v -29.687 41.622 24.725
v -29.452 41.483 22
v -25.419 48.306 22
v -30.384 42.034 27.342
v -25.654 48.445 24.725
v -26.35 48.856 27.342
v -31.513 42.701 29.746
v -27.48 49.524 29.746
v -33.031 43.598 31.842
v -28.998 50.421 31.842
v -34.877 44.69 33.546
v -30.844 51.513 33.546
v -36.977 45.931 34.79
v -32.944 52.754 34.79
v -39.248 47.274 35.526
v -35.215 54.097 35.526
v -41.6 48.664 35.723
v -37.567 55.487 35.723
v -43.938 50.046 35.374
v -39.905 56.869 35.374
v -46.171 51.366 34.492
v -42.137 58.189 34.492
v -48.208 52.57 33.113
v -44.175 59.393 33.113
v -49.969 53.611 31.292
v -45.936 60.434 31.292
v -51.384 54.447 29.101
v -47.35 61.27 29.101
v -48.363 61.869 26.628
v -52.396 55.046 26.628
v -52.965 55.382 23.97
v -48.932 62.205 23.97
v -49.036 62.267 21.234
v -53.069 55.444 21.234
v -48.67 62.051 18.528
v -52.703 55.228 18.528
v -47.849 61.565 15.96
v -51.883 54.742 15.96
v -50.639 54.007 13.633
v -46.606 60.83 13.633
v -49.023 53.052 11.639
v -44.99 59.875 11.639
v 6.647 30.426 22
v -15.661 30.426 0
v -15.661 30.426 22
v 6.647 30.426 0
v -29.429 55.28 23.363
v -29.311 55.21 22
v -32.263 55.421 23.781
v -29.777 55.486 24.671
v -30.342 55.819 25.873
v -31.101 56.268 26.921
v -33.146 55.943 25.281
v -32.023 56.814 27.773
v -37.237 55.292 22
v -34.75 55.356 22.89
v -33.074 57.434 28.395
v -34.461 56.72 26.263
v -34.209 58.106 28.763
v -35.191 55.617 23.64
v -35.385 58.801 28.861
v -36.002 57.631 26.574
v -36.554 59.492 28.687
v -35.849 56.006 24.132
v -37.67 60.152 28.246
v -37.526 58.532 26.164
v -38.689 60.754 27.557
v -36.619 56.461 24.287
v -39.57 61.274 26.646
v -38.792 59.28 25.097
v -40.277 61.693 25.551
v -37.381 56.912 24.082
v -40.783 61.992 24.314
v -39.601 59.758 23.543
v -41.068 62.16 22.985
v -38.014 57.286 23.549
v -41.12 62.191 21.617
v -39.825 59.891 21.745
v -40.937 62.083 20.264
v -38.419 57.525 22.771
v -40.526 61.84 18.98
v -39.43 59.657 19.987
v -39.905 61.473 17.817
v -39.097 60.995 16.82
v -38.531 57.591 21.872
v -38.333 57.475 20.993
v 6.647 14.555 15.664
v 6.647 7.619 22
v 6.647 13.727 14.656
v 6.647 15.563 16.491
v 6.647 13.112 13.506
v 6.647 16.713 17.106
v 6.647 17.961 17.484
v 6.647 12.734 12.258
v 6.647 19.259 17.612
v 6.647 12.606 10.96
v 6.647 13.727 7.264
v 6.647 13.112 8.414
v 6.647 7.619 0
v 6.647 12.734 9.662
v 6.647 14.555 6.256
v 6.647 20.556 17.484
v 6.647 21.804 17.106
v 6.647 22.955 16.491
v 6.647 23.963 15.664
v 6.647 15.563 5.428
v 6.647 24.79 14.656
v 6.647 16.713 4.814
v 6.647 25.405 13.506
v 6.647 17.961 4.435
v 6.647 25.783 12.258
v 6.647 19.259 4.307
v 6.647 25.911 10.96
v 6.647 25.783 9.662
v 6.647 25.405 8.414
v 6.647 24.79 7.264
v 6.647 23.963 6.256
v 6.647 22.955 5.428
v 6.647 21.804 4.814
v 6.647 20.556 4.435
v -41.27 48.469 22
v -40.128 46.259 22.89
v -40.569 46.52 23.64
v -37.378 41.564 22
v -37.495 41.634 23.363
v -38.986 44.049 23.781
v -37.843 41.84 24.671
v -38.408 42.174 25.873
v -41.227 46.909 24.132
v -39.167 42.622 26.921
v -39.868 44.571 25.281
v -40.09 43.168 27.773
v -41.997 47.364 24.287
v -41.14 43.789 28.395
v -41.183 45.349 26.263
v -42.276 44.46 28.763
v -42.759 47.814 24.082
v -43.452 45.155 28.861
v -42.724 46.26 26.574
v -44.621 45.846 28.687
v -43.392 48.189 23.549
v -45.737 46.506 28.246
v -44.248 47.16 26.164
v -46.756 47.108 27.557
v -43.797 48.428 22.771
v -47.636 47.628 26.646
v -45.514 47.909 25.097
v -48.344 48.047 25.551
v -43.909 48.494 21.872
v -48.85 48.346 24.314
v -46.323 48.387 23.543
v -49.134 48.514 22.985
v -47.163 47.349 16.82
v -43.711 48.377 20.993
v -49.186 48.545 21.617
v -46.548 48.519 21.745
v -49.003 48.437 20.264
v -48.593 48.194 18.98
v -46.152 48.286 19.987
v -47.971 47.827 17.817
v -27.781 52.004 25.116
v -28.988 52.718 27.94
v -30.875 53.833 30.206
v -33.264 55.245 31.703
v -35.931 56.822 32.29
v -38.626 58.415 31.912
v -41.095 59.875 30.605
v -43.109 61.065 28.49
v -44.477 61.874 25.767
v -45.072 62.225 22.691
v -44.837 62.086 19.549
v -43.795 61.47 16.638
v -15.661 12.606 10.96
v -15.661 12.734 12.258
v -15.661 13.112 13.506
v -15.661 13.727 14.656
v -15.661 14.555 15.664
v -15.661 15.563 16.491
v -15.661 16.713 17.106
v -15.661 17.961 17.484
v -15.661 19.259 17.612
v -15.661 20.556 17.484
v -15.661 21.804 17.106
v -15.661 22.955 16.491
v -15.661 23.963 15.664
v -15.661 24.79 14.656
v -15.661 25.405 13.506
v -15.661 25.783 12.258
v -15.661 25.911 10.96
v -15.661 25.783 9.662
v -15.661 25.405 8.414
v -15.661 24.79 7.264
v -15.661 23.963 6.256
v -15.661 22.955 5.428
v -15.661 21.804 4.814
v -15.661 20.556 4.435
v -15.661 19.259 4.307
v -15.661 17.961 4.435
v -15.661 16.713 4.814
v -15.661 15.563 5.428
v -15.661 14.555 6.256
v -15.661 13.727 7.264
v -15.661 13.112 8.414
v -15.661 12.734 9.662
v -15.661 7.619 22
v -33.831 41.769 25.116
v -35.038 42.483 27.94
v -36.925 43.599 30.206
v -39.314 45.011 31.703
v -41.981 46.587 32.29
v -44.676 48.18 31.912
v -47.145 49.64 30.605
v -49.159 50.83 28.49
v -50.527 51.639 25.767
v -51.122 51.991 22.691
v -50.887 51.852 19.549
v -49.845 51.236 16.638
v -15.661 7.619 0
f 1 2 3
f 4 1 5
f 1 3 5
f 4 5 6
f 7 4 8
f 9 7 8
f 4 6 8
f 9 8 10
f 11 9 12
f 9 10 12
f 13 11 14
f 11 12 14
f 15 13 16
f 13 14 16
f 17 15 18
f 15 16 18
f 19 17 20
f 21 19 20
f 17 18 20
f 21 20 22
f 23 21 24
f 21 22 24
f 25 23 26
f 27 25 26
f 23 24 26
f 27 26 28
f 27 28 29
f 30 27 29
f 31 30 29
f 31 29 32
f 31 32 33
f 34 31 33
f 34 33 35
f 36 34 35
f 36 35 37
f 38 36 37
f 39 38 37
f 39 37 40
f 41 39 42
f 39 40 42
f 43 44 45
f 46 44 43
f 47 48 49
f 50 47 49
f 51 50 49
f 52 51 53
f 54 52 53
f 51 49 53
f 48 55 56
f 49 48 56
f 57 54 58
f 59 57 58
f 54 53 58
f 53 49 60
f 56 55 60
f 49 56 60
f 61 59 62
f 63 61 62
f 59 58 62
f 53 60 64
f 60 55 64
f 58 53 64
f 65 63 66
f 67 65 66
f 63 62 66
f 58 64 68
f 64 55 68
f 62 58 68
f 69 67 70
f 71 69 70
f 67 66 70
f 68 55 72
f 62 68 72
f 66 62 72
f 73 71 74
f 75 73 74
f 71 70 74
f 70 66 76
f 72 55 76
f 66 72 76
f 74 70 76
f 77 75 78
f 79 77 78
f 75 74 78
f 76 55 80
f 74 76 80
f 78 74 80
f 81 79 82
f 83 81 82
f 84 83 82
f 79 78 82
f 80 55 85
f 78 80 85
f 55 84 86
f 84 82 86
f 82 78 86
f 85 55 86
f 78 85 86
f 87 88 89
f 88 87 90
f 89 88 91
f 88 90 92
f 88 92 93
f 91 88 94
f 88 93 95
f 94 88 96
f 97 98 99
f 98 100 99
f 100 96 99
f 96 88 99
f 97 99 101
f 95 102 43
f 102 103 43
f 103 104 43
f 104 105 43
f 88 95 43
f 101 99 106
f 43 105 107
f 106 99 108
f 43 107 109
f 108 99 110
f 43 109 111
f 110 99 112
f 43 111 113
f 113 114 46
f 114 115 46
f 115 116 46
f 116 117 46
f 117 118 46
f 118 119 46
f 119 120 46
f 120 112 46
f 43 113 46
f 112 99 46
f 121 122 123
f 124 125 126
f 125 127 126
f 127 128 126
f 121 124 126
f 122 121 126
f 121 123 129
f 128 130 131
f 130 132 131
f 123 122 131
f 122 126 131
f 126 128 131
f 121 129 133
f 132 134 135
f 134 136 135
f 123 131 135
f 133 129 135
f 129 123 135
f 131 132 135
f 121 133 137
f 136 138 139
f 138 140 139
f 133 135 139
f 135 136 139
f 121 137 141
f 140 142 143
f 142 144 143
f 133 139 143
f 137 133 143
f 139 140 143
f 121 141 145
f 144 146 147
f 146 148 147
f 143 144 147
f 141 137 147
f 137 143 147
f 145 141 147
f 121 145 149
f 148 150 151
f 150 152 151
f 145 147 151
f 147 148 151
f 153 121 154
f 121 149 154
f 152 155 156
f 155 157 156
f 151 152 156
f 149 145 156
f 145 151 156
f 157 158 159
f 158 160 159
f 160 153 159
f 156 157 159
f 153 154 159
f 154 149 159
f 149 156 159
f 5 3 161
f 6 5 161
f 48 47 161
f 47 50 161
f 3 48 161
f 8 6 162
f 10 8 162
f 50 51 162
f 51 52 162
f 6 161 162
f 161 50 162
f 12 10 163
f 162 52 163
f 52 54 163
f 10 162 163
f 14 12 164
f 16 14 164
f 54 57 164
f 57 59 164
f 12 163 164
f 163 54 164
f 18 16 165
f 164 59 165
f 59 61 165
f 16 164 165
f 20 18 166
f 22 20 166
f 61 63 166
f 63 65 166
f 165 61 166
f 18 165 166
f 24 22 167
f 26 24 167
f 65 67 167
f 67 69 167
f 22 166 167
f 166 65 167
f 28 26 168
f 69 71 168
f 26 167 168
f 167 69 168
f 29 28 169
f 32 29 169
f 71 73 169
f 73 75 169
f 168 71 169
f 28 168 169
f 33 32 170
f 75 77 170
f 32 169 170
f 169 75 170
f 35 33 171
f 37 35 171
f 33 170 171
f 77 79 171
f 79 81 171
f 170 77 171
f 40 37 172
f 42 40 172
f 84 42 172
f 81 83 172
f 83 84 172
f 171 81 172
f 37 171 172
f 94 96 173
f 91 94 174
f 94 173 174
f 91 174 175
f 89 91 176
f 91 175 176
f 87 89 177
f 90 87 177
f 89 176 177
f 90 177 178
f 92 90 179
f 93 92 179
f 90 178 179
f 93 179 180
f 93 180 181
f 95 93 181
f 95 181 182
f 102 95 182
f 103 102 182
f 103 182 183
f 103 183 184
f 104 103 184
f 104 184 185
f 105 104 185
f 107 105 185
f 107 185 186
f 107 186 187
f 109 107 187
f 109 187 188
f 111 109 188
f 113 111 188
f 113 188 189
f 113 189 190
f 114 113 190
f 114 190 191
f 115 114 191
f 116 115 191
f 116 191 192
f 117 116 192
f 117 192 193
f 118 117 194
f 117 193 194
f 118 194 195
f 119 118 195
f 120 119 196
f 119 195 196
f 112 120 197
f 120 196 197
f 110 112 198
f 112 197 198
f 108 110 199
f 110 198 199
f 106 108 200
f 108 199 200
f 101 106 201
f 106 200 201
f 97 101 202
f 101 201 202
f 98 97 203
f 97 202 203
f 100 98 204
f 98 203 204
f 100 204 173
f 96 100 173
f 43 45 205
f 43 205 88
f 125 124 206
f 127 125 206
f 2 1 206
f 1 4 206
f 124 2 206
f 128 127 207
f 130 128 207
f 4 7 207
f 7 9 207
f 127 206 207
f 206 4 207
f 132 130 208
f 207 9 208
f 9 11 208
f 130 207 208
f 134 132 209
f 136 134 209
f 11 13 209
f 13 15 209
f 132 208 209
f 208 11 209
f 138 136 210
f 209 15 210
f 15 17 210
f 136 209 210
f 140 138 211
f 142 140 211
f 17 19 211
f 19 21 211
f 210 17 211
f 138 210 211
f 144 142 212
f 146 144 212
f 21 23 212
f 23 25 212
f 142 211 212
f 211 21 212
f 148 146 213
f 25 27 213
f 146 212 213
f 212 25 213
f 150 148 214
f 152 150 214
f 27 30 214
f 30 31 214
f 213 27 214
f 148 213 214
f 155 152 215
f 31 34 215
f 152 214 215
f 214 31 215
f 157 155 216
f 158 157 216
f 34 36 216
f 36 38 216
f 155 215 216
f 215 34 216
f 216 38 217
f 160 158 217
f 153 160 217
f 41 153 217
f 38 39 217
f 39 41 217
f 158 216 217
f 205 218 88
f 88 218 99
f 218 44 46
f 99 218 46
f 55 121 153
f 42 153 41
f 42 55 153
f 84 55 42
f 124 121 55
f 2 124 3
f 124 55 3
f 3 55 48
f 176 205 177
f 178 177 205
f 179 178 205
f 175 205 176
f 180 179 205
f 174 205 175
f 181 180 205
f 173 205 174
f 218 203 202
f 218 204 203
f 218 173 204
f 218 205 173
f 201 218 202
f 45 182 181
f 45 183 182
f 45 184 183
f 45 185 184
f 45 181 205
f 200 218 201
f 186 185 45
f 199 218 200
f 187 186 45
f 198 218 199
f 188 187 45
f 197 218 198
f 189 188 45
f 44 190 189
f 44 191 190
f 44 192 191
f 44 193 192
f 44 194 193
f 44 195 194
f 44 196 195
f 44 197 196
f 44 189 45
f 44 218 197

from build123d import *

# Parameters (mm, degrees)
SKETCH_1_W          = 22.308560603
SKETCH_1_H          = 22.806719796
EXTRUDE_1_DEPTH     = 22
SKETCH_11_R         = 6.652524896
CUT_EXTRUDE_1_DEPTH = 33
REVOLVE_1_ANGLE     = 229


with BuildPart() as part:
    # 草图1 → 凸台-拉伸1 (new body)
    with BuildSketch(Plane.XY):
        with Locations((-4.507095638, 19.02246425)):
            Rectangle(SKETCH_1_W, SKETCH_1_H)
    extrude(amount=EXTRUDE_1_DEPTH)

    # 草图11 → 切除-拉伸1 (cut)
    with BuildSketch(Plane.ZY.offset(15.661375939)):
        with Locations(Location((10.959794673, 19.258589263, 0), (0, 0, 270))):
            Circle(SKETCH_11_R)
    extrude(amount=-CUT_EXTRUDE_1_DEPTH, mode=Mode.SUBTRACT)


with BuildPart() as body_2:
    # 草图16 → 旋转1 (revolve)
    with BuildSketch(Plane(origin=(-29.556896168, 29.643832508, 22), x_dir=(1, 0, 0), z_dir=(0, 0, 1))):
        Polygon((-11.713079065, 18.824982723), (-7.820876875, 11.920554491), (0.104634468, 11.839086348), (4.13794362, 18.662046437), (0.245741431, 25.566474669), (-7.679769912, 25.647942812), align=None)
    revolve(axis=Axis((-37.23666608, 55.29177532, 22), (-0.5088751893161755, -0.860840311380936, 0)), revolution_arc=REVOLVE_1_ANGLE)


solid = Compound([part.part, body_2.part])
